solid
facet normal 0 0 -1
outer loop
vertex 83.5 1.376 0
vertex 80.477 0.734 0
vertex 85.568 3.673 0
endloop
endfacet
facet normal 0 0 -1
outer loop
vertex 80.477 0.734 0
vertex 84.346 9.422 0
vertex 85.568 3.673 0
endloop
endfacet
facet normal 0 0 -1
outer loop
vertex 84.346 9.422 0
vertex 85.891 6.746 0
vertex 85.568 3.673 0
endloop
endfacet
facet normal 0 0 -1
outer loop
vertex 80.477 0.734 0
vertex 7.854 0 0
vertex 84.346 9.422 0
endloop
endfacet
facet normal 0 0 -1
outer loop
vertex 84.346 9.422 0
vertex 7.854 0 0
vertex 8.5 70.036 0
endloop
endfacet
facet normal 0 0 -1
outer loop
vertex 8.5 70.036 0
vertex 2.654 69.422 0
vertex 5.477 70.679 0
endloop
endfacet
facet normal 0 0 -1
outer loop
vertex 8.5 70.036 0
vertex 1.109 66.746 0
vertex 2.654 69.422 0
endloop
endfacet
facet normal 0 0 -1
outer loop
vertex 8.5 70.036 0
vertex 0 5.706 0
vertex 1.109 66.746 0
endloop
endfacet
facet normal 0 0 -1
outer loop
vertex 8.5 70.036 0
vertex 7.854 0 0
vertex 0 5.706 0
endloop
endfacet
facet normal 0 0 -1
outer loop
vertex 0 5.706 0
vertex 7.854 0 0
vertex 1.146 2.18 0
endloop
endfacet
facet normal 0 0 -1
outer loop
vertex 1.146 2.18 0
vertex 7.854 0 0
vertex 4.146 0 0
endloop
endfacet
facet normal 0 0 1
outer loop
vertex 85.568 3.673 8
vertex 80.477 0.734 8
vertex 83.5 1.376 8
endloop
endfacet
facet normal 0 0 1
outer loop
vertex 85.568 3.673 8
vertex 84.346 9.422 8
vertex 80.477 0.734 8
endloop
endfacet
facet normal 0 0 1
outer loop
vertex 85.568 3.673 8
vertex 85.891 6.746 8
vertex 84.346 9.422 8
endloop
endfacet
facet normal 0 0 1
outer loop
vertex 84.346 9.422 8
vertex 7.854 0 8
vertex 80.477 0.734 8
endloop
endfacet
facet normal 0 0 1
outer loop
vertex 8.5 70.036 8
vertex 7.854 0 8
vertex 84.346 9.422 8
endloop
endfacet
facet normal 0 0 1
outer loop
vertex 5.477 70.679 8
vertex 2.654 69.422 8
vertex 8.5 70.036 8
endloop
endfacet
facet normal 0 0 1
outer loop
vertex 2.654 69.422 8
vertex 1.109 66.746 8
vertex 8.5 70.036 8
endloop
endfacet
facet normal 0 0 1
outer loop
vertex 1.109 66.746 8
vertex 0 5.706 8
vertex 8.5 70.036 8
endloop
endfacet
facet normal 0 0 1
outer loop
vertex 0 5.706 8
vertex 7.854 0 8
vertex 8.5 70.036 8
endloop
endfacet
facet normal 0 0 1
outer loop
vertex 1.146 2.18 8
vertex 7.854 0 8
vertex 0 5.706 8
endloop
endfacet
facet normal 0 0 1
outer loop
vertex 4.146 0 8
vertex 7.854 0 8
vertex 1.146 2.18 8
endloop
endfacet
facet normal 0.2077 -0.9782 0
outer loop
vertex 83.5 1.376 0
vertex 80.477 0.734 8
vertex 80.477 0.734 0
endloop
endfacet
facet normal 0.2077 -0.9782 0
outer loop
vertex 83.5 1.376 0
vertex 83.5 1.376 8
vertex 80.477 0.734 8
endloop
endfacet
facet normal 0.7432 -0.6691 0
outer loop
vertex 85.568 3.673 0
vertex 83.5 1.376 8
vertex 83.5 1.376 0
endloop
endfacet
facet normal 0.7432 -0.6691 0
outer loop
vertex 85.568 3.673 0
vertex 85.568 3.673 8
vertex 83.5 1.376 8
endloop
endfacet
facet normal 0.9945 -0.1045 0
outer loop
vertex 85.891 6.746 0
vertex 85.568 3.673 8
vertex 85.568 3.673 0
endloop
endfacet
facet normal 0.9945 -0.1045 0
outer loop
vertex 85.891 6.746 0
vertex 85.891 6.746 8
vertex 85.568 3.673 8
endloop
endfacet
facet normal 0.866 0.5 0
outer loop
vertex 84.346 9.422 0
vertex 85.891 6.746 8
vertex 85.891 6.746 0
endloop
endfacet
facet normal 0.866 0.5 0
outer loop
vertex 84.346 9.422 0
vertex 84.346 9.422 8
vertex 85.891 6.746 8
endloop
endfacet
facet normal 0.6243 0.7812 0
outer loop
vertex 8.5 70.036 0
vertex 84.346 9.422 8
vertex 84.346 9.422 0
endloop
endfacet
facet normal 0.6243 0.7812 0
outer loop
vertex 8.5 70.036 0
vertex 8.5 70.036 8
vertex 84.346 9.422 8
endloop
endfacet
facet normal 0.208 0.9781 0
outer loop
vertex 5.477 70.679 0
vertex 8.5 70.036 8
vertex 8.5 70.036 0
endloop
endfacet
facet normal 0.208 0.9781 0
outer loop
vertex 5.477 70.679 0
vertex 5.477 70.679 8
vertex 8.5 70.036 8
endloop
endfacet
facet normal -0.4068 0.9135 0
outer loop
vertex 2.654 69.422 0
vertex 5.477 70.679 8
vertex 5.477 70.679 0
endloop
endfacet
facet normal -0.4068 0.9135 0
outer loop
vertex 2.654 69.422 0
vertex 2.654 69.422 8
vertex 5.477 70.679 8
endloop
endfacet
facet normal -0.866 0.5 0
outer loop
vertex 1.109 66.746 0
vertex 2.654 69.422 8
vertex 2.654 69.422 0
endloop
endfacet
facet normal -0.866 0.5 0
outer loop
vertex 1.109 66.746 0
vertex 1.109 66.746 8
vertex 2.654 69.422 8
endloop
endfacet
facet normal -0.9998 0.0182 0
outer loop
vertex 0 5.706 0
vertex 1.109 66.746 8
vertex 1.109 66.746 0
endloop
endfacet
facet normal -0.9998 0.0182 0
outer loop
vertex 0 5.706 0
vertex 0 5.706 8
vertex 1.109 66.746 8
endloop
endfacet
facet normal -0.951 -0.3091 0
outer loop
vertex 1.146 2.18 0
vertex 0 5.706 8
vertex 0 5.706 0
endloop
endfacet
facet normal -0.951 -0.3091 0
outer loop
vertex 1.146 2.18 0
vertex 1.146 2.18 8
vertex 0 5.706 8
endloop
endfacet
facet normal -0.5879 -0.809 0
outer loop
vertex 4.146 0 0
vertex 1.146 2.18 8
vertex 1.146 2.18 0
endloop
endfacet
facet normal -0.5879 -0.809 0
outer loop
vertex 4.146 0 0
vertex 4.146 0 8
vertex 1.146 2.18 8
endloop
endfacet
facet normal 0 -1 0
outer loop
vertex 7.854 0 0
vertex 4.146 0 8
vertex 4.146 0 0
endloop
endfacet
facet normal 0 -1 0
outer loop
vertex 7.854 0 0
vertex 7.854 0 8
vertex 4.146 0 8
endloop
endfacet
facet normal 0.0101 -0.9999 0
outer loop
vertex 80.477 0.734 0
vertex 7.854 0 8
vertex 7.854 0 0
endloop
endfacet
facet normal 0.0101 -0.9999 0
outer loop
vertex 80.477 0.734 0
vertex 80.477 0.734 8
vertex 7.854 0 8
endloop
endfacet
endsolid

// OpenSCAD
$fn = 32;

// ----------------------------------------------------------------------
// Lever arm: two bosses 12 and 10 mm, 75 mm between centres
// ----------------------------------------------------------------------

// --- parameters (mm) ---
profile_height = 8;       // extrusion height
profile_points = 13;      // points of the closed outline

profile = [[0, 5.706], [1.146, 2.18], [4.146, 0], [7.854, 0], [80.477, 0.734], [83.5, 1.376], [85.568, 3.673], [85.891, 6.746], [84.346, 9.422], [8.5, 70.036], [5.477, 70.679], [2.654, 69.422], [1.109, 66.746]];  // single closed polygon, 13 points, counter clockwise

// --- the one profile operation ---
linear_extrude(height = profile_height) polygon(points = profile);
